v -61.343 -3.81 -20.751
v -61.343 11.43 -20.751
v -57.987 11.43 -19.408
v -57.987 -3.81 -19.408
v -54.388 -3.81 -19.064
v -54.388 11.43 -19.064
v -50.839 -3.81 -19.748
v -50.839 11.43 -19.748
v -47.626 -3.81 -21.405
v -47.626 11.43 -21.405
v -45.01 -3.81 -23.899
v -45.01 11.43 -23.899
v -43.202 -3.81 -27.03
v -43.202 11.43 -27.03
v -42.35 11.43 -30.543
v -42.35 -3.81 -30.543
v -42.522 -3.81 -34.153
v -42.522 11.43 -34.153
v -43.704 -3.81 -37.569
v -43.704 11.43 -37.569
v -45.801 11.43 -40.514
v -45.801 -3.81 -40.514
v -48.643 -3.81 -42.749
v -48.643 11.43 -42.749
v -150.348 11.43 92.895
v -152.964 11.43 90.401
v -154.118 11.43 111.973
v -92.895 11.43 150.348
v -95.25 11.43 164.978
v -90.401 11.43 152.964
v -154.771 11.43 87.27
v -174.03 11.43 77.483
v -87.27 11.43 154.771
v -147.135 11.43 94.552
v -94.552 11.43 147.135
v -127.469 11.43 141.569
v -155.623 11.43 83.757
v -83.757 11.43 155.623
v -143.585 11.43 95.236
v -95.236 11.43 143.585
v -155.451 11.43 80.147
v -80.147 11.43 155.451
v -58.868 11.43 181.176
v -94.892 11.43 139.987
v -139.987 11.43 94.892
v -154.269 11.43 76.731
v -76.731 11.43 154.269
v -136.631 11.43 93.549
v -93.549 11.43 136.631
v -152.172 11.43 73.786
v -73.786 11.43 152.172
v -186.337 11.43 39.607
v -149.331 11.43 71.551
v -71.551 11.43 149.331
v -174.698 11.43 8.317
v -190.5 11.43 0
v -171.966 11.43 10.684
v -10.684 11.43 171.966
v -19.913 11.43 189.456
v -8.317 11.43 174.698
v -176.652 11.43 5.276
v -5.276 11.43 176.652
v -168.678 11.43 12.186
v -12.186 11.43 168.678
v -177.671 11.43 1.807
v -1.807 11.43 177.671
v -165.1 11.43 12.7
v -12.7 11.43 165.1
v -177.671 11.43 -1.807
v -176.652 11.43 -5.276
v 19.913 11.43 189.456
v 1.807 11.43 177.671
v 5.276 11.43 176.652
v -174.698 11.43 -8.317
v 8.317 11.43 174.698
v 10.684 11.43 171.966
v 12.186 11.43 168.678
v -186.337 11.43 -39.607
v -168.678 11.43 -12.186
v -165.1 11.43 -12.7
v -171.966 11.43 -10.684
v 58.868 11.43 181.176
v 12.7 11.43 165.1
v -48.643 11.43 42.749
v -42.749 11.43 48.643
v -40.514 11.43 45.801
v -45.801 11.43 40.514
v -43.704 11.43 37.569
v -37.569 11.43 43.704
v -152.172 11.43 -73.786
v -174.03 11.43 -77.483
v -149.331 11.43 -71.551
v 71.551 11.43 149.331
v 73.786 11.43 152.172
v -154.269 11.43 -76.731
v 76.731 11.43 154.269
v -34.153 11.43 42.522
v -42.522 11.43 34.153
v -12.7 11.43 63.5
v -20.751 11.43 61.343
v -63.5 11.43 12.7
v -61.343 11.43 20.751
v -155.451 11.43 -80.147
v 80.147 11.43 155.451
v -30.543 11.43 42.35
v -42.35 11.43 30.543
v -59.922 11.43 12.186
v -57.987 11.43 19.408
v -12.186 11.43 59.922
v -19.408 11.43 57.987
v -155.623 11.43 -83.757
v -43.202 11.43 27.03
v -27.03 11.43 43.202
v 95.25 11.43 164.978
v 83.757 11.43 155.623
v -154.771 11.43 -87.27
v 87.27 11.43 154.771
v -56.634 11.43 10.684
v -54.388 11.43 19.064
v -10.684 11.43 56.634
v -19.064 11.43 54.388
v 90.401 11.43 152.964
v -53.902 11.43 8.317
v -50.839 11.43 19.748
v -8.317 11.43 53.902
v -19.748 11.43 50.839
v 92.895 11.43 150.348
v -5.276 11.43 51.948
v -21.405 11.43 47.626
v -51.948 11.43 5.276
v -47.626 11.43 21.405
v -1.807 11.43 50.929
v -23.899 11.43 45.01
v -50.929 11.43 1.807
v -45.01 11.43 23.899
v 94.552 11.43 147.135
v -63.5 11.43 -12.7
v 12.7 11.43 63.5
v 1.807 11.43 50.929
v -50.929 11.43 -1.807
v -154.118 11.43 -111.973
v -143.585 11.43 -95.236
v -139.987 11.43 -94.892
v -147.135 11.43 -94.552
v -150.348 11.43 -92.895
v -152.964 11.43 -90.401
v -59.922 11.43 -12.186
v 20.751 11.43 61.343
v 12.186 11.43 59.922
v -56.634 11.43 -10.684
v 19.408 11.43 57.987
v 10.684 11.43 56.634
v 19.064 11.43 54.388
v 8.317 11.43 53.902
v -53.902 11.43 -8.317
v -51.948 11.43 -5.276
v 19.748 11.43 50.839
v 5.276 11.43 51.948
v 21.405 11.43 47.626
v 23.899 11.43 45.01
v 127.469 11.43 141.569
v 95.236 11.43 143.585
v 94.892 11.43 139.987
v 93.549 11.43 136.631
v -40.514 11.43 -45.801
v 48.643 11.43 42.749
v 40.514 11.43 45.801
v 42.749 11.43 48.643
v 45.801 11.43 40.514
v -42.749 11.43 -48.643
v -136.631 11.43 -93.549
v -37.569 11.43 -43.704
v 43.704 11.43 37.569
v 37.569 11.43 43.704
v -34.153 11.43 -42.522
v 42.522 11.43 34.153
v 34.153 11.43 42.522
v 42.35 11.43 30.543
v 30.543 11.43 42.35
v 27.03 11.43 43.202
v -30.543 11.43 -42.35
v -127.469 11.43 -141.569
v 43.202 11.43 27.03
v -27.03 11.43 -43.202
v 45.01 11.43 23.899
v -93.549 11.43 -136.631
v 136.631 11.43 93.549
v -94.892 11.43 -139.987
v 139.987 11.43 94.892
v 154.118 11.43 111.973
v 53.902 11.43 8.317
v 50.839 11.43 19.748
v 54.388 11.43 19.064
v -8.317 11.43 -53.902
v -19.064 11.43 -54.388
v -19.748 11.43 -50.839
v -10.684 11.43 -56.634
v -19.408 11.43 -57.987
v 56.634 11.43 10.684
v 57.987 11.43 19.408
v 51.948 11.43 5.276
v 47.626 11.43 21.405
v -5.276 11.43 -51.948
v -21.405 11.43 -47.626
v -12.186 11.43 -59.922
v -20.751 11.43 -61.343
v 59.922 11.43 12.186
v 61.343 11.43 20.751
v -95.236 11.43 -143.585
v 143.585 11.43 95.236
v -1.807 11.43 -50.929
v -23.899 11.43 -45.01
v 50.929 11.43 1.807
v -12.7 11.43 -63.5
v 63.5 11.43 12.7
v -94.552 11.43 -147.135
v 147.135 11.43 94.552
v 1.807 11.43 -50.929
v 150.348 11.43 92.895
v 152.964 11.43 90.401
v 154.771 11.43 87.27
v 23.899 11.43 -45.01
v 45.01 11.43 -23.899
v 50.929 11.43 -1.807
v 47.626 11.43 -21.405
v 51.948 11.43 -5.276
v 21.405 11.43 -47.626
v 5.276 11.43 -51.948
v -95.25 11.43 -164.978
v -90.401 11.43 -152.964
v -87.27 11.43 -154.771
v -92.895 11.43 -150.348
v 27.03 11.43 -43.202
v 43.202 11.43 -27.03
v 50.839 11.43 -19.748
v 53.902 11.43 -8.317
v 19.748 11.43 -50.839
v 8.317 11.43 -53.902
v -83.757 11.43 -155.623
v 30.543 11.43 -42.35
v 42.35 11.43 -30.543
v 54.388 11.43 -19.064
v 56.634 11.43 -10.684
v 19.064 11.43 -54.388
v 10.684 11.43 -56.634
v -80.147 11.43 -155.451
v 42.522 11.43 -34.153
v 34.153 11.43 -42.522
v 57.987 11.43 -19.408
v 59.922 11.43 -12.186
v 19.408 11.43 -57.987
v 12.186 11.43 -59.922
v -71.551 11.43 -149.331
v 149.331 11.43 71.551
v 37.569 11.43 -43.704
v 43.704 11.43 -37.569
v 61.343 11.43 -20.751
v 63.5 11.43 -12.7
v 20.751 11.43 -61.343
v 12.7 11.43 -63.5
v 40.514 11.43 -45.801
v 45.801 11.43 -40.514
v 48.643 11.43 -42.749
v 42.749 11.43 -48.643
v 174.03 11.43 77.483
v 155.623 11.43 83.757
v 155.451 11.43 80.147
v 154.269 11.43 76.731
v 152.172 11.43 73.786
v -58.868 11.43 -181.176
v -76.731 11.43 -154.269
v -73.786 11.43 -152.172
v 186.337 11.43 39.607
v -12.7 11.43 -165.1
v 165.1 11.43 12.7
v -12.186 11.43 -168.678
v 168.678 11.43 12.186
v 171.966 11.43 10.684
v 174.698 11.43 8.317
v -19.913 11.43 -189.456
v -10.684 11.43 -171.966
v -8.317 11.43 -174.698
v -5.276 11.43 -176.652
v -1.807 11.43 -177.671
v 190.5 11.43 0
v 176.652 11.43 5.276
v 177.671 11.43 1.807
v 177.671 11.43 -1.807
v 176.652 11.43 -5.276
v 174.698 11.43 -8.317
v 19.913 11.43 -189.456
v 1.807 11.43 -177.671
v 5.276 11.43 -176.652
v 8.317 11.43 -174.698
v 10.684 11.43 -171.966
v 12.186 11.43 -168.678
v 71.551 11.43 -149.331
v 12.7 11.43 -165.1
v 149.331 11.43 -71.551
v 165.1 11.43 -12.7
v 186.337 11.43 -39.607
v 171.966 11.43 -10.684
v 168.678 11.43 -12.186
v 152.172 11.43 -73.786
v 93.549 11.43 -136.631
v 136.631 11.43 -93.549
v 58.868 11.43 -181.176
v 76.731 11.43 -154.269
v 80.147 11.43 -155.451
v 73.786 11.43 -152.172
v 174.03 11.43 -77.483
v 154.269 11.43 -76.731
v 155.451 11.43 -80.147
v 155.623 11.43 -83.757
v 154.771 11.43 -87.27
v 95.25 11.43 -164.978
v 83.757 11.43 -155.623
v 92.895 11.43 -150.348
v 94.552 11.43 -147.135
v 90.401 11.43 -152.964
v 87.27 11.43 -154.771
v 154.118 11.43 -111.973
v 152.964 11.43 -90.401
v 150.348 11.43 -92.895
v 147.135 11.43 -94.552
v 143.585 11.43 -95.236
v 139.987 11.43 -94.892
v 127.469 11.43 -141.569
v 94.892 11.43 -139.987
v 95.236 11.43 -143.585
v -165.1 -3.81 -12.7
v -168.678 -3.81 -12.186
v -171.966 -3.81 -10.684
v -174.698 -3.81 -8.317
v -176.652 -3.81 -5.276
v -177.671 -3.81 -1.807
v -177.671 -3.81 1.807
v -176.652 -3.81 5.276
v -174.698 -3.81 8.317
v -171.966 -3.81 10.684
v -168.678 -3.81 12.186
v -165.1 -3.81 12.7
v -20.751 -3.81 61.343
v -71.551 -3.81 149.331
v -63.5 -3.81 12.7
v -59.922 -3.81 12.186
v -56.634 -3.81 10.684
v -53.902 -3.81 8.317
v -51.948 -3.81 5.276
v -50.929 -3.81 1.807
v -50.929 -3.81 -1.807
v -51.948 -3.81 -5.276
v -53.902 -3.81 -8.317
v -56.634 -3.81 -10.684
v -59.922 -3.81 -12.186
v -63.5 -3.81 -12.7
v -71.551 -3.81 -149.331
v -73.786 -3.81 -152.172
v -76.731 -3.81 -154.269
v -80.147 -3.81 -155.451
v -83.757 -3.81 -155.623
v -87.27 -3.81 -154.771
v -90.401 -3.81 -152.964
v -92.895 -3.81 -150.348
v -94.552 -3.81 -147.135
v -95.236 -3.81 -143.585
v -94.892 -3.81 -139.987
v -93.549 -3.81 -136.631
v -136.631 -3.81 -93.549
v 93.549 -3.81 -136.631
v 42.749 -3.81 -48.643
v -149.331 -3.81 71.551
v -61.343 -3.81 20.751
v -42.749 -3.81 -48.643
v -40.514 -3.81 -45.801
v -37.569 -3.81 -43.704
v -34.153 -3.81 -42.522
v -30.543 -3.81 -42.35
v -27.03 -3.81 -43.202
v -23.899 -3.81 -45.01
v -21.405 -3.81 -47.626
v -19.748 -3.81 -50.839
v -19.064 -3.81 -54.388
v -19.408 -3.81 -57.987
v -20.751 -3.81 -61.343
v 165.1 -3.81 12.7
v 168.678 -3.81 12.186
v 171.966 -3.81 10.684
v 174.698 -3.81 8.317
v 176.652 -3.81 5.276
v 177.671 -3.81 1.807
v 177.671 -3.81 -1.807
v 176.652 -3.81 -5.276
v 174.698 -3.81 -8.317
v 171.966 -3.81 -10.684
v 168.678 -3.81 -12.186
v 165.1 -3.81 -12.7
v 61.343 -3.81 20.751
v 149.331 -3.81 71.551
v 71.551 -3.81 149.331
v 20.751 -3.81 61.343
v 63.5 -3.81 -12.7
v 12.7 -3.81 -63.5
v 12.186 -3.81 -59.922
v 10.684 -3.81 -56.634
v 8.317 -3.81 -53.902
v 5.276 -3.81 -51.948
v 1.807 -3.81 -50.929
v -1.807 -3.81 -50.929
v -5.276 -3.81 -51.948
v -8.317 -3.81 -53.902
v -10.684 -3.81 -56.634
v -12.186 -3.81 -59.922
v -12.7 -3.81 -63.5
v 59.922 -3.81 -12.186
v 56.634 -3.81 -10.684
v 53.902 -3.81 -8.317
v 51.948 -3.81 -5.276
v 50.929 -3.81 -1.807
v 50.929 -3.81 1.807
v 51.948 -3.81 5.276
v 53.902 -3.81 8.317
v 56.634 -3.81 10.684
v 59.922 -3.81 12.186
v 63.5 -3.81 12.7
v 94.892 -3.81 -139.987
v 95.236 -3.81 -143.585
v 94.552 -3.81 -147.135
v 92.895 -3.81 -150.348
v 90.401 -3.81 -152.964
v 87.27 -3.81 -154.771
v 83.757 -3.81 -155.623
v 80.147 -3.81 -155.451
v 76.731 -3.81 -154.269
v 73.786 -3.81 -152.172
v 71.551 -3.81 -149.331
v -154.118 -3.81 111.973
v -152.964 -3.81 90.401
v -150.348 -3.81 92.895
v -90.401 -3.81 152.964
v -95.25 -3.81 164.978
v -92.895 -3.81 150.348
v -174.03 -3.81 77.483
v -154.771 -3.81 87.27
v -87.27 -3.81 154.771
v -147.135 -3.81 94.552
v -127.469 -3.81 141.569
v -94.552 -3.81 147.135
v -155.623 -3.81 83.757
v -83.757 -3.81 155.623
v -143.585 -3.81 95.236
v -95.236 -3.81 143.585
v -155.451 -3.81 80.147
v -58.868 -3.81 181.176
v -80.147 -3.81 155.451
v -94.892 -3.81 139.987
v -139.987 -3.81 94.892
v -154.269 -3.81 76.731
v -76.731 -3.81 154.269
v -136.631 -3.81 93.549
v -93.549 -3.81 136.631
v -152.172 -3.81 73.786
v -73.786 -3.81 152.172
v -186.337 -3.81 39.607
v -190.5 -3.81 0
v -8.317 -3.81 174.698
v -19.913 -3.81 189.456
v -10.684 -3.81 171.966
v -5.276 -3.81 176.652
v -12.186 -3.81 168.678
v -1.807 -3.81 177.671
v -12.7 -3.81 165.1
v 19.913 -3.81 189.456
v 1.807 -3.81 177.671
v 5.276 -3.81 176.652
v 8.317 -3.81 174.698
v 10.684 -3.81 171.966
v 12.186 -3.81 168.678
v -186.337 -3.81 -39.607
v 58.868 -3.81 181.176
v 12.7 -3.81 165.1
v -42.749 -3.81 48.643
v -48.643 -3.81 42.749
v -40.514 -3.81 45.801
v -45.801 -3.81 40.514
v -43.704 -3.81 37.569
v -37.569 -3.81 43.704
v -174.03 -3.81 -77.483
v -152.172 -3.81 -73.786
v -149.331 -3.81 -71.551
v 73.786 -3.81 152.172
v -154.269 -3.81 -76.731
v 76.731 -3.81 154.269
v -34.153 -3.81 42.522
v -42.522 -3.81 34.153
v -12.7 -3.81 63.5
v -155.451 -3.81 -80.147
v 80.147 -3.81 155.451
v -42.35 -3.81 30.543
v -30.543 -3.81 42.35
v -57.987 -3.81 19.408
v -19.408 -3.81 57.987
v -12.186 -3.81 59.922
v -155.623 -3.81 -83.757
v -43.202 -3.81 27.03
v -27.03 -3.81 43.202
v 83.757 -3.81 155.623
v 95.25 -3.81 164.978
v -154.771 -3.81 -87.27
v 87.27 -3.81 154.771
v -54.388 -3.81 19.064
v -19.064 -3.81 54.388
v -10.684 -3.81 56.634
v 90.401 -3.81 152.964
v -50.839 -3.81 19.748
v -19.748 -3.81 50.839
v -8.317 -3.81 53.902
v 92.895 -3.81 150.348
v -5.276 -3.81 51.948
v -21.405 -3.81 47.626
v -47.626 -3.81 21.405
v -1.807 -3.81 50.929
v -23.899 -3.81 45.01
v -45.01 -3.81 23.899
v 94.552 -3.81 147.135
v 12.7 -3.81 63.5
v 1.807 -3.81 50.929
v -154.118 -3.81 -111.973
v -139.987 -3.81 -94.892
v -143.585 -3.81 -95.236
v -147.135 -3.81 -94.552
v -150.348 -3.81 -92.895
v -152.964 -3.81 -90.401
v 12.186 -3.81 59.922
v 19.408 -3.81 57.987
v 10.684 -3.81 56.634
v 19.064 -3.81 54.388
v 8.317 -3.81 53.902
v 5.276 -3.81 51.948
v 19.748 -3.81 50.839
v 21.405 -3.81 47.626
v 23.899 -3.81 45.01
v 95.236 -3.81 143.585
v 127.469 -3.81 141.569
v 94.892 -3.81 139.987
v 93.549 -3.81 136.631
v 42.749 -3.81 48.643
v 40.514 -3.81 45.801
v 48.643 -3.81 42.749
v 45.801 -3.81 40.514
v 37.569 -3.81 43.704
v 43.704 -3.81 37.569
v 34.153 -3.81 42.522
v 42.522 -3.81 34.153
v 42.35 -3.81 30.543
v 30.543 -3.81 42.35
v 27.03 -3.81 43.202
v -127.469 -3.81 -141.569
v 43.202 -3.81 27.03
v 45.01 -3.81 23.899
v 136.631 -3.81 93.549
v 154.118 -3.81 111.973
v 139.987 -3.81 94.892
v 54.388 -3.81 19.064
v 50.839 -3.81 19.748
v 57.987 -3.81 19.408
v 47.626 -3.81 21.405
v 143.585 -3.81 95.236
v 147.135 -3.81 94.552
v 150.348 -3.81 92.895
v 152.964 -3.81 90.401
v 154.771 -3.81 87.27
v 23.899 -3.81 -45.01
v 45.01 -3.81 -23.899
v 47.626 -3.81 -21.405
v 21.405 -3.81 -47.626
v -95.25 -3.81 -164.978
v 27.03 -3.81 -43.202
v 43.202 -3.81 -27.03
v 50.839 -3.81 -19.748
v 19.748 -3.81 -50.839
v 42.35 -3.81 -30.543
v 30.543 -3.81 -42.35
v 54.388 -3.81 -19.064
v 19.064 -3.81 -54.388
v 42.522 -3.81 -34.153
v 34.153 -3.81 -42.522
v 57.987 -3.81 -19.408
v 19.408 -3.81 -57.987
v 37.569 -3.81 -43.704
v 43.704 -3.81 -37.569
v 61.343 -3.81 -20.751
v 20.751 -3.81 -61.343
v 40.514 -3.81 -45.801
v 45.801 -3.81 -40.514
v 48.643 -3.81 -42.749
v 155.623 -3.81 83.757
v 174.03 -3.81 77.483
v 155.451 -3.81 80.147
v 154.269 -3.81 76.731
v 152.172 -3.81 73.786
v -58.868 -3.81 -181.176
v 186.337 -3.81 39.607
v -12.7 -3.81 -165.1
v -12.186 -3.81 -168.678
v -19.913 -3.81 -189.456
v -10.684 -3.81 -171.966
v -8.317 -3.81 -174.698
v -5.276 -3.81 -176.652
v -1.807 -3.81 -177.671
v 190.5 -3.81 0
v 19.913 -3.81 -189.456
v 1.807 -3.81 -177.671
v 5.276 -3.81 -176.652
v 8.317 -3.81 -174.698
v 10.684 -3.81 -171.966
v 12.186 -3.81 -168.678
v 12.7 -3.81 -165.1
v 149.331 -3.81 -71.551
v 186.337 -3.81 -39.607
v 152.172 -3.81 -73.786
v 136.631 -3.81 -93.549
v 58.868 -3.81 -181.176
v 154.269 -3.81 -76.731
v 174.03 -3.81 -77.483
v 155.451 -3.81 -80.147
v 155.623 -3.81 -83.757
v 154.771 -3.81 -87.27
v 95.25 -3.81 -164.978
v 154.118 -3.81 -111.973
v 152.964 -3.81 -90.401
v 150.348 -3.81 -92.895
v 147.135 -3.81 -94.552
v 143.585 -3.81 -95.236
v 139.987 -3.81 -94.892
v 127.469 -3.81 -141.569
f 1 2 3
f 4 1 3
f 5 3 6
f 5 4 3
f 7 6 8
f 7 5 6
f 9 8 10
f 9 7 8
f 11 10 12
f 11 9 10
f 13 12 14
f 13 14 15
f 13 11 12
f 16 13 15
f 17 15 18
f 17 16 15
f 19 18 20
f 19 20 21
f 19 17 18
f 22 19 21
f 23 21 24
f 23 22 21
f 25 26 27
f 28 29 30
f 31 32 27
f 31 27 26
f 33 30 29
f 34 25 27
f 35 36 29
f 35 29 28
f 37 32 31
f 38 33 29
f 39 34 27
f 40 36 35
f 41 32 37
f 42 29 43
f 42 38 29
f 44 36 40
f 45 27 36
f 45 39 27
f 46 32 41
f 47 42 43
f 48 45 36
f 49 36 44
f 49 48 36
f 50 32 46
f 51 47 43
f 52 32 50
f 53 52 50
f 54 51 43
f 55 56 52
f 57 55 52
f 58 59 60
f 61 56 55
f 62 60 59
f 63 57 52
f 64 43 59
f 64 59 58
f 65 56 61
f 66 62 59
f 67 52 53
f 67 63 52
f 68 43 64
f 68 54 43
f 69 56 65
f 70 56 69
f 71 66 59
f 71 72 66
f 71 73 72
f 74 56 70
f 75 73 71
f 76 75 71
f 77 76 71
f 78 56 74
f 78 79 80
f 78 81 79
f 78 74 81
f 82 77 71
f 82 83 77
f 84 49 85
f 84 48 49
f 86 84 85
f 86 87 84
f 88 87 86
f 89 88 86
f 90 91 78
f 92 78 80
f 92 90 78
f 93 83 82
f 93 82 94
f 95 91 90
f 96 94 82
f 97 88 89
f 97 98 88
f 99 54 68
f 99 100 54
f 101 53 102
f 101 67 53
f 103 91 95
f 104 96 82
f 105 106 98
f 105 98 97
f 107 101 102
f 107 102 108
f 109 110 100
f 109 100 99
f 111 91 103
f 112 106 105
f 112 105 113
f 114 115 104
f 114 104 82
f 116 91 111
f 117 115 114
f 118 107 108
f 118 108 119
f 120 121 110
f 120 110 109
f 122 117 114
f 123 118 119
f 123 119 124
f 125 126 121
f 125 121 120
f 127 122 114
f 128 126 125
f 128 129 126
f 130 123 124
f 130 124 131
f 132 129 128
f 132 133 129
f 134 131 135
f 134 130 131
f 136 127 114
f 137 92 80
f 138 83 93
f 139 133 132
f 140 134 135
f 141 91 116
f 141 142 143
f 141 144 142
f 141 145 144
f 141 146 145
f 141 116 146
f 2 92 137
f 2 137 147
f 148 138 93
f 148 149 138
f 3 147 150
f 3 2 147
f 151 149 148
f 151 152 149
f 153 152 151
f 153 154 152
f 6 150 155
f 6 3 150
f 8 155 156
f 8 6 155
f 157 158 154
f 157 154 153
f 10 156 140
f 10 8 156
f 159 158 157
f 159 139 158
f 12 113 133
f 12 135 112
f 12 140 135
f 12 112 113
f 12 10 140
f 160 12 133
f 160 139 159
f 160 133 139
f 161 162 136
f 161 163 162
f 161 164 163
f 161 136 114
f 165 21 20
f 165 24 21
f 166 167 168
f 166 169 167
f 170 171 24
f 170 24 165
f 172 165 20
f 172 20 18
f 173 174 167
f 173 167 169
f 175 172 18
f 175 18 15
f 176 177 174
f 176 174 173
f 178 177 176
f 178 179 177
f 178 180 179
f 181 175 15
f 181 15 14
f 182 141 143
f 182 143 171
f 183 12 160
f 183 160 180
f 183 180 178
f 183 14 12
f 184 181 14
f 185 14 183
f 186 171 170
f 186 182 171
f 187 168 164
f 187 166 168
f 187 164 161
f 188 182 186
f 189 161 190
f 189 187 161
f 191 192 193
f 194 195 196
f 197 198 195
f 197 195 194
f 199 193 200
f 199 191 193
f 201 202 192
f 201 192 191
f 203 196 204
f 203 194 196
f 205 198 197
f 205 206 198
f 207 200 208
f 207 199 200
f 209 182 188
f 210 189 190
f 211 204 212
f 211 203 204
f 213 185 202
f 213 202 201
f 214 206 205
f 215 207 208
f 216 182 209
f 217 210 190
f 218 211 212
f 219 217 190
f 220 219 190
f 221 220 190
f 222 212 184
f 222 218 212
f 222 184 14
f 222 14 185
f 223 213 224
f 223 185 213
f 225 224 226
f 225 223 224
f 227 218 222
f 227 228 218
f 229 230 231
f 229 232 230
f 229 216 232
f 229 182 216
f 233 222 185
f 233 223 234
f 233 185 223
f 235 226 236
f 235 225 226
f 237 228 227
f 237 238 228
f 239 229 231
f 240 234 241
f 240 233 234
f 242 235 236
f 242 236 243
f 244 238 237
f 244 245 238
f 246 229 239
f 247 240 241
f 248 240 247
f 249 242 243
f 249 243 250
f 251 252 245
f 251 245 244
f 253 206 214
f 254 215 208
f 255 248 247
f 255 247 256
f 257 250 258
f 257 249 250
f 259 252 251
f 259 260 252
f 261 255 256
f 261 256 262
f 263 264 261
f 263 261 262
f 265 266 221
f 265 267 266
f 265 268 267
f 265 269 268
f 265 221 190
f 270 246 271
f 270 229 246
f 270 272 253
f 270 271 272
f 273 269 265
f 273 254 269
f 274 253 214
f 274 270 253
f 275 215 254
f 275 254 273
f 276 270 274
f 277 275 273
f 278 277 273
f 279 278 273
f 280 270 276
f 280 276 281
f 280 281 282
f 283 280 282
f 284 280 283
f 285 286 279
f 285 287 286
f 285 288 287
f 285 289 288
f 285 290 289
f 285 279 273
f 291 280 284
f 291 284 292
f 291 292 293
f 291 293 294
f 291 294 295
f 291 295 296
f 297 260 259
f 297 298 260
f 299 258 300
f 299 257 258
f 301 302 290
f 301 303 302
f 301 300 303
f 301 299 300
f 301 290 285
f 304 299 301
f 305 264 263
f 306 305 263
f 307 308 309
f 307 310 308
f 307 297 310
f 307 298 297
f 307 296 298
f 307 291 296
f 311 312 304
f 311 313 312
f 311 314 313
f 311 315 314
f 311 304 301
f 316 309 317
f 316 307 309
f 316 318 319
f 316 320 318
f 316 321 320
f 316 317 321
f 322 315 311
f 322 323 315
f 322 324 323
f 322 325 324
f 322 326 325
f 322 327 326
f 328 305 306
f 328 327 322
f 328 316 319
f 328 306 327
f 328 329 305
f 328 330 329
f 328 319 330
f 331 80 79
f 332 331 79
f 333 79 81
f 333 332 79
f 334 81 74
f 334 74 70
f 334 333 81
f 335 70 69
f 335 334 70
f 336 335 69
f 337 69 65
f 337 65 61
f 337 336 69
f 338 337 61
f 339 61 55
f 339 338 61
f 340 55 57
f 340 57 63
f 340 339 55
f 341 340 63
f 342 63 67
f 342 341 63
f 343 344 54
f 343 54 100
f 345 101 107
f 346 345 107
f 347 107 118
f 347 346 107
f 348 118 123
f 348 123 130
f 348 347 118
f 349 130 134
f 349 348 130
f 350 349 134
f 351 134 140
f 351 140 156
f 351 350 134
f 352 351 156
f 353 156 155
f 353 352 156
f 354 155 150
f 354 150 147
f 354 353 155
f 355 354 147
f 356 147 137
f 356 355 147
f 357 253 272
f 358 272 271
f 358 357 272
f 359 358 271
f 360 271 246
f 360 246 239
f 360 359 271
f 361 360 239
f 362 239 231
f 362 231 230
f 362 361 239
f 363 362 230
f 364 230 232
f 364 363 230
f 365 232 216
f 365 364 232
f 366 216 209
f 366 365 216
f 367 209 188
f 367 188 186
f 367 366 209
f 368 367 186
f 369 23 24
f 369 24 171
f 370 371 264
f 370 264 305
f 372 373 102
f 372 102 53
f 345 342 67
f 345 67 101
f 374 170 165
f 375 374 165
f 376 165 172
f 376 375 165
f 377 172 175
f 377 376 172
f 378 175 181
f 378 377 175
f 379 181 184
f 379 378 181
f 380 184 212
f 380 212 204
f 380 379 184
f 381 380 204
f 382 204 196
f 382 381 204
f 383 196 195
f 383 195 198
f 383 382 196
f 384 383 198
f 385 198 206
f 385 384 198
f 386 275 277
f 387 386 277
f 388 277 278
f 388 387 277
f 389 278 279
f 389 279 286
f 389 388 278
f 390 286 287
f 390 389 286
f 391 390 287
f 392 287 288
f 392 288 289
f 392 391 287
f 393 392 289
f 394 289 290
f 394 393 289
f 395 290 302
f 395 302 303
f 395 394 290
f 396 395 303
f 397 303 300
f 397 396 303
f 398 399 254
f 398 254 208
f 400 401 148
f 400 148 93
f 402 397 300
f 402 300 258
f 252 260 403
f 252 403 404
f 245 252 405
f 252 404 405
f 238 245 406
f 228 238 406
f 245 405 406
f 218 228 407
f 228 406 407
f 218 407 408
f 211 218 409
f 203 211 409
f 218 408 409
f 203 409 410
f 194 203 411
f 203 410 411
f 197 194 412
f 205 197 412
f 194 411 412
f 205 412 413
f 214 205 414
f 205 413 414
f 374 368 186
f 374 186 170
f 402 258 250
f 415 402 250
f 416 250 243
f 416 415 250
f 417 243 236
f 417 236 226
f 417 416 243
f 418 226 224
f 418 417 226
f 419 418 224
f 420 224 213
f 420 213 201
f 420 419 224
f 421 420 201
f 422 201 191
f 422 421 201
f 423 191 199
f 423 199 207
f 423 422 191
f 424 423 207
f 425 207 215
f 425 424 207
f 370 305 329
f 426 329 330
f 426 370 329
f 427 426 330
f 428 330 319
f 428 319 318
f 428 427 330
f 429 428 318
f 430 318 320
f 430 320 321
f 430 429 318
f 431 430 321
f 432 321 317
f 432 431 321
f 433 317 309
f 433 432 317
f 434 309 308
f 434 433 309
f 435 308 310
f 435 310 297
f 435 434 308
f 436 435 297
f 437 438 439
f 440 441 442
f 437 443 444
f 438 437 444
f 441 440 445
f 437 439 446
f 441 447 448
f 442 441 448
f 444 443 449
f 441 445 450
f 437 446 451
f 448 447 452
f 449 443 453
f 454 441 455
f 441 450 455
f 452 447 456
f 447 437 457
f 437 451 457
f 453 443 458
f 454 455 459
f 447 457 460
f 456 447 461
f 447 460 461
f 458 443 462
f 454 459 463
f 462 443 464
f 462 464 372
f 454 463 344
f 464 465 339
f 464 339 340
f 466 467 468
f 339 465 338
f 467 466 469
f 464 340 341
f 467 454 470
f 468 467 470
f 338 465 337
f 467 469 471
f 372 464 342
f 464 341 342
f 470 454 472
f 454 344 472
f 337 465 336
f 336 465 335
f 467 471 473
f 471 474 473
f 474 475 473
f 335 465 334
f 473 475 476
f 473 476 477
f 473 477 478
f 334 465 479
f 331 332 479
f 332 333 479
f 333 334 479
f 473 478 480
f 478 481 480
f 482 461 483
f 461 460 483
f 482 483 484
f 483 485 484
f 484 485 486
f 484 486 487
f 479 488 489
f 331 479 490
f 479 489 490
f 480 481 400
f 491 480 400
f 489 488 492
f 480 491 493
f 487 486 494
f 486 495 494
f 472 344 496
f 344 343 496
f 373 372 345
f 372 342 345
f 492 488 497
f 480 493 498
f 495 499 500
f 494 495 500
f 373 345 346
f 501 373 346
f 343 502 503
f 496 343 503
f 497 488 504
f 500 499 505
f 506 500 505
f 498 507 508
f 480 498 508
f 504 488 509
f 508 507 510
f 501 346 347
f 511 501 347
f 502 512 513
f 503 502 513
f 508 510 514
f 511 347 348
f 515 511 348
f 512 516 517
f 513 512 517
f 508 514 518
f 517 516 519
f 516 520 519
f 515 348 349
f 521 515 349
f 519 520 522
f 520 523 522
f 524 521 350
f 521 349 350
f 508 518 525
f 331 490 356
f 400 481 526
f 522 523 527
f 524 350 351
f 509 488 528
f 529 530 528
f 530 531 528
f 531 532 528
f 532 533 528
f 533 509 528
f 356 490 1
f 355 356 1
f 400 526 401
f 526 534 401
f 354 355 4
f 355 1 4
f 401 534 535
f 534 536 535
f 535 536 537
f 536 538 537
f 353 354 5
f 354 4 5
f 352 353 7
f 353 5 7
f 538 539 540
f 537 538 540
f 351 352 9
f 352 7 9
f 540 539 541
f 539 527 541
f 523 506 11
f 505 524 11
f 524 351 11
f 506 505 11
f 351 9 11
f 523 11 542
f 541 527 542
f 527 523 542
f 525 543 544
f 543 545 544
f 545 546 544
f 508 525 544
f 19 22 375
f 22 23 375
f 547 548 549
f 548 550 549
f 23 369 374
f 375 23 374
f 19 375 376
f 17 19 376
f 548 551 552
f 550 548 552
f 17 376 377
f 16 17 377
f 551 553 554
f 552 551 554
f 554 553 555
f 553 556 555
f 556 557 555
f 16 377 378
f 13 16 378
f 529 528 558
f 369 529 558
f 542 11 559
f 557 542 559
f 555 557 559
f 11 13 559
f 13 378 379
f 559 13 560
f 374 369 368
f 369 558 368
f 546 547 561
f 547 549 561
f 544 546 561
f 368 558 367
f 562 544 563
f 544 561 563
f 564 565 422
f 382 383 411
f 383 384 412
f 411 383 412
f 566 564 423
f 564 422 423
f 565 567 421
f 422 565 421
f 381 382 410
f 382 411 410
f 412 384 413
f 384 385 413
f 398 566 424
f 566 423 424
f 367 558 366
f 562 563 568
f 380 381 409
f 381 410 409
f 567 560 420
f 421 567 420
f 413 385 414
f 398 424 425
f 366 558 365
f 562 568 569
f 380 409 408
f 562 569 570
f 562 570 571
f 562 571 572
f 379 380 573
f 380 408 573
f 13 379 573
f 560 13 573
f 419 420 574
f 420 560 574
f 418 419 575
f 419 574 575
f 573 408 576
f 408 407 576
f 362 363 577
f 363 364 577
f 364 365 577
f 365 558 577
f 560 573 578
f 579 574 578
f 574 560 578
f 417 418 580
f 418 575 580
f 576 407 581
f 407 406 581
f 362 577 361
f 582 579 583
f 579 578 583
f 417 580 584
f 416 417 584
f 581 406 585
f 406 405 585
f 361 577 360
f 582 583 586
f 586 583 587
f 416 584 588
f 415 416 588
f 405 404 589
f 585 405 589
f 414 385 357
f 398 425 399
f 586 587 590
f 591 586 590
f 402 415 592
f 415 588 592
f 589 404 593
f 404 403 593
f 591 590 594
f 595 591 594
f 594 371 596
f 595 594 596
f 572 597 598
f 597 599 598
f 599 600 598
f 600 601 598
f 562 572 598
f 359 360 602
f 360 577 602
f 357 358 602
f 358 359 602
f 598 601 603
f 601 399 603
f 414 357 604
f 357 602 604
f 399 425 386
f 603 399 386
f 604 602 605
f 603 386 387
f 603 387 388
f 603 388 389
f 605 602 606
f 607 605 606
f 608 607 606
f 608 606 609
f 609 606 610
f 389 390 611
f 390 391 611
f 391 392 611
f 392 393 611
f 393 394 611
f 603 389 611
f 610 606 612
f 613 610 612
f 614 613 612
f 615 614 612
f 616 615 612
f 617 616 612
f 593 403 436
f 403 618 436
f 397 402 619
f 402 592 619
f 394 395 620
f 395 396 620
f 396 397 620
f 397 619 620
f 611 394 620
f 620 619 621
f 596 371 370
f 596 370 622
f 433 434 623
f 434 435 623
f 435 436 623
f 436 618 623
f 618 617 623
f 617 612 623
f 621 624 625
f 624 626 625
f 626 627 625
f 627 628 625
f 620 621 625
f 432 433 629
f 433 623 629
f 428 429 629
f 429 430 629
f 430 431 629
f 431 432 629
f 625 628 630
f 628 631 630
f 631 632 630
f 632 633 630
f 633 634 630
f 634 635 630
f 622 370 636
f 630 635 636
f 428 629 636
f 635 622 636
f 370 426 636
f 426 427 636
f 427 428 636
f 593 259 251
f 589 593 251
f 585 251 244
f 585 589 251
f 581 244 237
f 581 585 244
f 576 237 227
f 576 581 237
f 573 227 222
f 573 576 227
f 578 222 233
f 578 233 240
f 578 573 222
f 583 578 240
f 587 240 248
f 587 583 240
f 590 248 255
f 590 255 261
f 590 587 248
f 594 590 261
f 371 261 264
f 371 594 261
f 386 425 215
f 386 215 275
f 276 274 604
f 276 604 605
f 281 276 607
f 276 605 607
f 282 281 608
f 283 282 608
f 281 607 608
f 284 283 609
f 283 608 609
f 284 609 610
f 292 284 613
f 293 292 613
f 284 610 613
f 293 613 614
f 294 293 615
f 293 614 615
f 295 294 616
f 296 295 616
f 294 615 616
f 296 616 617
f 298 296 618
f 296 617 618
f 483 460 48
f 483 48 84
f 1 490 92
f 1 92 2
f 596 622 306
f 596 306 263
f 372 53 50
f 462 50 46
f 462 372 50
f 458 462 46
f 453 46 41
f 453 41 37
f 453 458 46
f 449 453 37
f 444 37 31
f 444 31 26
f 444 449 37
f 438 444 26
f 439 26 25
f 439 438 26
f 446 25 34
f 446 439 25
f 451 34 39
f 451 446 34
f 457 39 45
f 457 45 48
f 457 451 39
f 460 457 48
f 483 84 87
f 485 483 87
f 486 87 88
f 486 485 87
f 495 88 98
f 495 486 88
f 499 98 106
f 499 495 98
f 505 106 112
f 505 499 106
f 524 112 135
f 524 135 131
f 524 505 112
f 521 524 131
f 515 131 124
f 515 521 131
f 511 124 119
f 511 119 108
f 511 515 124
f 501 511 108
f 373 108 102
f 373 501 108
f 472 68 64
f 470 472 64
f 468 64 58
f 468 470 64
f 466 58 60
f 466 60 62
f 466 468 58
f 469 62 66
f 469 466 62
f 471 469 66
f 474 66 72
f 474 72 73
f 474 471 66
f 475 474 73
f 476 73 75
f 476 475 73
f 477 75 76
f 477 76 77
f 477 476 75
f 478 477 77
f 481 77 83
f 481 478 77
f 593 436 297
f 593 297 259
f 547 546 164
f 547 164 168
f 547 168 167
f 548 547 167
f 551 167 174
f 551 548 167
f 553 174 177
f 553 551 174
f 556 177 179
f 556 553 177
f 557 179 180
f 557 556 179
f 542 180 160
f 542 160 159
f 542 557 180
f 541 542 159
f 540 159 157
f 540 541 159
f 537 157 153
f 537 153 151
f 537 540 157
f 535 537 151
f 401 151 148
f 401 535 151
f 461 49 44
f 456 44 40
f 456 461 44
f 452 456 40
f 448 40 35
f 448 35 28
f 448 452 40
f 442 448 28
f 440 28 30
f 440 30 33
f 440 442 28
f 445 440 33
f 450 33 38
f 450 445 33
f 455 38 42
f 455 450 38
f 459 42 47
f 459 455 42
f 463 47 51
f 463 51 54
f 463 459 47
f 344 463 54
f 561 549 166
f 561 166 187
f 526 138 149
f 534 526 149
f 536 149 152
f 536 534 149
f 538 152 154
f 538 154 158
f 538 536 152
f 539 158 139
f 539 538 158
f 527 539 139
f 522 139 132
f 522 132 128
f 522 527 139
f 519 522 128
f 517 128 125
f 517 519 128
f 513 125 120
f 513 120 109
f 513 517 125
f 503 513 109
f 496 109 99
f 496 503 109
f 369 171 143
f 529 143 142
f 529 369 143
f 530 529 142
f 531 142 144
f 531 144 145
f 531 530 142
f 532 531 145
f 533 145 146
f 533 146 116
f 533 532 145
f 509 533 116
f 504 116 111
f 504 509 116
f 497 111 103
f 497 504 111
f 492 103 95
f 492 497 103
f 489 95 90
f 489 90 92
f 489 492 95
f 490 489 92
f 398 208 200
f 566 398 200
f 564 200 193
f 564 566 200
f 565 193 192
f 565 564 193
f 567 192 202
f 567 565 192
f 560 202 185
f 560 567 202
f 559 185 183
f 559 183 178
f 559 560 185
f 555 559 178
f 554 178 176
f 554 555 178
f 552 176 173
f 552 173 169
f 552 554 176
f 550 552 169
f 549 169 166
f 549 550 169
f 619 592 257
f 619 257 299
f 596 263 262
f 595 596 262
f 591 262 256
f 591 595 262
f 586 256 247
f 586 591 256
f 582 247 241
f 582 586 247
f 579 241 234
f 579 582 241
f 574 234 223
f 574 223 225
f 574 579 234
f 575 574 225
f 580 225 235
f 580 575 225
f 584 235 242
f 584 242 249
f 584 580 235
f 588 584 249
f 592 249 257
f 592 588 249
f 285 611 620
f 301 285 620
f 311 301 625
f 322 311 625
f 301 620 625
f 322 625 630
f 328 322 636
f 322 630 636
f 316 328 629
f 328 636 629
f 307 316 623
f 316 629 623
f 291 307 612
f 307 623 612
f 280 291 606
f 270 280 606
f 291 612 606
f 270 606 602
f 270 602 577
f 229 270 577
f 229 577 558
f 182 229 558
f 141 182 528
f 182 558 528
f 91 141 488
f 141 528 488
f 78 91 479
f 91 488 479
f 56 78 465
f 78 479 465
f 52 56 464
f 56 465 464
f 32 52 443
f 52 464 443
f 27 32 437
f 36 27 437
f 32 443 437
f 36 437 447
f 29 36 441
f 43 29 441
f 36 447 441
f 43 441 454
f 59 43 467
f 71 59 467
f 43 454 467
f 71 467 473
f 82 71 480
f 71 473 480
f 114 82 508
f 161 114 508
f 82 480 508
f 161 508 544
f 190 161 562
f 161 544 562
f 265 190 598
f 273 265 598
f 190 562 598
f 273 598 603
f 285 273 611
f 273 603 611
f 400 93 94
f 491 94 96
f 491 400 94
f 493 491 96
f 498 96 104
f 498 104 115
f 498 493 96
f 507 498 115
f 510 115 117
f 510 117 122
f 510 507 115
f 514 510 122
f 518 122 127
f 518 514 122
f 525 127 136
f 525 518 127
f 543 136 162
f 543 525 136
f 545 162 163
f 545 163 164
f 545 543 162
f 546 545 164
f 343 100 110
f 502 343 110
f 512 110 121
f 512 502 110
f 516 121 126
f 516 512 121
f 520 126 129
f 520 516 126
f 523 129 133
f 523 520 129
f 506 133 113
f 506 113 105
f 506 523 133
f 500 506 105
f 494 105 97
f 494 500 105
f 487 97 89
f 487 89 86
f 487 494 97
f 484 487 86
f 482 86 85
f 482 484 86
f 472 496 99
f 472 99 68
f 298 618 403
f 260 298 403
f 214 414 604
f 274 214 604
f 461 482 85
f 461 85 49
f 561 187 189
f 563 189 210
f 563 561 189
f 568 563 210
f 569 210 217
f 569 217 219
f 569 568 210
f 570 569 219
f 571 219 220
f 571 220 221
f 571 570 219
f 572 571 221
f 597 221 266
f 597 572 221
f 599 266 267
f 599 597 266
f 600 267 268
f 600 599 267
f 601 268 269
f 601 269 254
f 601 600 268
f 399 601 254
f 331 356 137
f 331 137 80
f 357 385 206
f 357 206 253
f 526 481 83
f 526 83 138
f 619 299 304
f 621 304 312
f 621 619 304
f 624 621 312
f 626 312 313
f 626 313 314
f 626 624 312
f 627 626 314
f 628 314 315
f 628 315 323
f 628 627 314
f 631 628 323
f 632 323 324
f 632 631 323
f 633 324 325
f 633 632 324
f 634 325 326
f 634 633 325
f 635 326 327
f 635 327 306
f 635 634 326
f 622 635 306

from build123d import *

# Parameters (mm, degrees)
SKETCH1_R           = 95.25
BOSS_EXTRUDE3_DEPTH = 7.62
SCALE1_SCALE        = 2


with BuildPart() as part:
    # Sketch1 → Boss-Extrude3 (new body)
    with BuildSketch(Plane(origin=(0, 0, 0), x_dir=(1, 0, 0), z_dir=(0, 1, 0))):
        Circle(SKETCH1_R)
        with BuildLine():
            Line((6.35, 82.55), (6.35, 31.75))
            ThreePointArc((6.35, 31.75), (0, 25.4), (-6.35, 31.75))
            Line((-6.35, 31.75), (-6.35, 82.55))
            ThreePointArc((-6.35, 82.55), (0, 88.9), (6.35, 82.55))
        make_face(mode=Mode.SUBTRACT)
        with BuildLine():
            Line((35.775738686, 74.665397082), (10.375738686, 30.67130657))
            ThreePointArc((10.375738686, 30.67130657), (12.7, 21.997045256), (21.374261314, 24.32130657))
            Line((21.374261314, 24.32130657), (46.774261314, 68.315397082))
            ThreePointArc((46.774261314, 68.315397082), (44.45, 76.989658396), (35.775738686, 74.665397082))
        make_face(mode=Mode.SUBTRACT)
        with BuildLine():
            Line((68.315397082, 46.774261314), (24.32130657, 21.374261314))
            ThreePointArc((24.32130657, 21.374261314), (21.997045256, 12.7), (30.67130657, 10.375738686))
            Line((30.67130657, 10.375738686), (74.665397082, 35.775738686))
            ThreePointArc((74.665397082, 35.775738686), (76.989658396, 44.45), (68.315397082, 46.774261314))
        make_face(mode=Mode.SUBTRACT)
        with BuildLine():
            Line((82.55, 6.35), (31.75, 6.35))
            ThreePointArc((31.75, 6.35), (25.4, 0), (31.75, -6.35))
            Line((31.75, -6.35), (82.55, -6.35))
            ThreePointArc((82.55, -6.35), (88.9, 0), (82.55, 6.35))
        make_face(mode=Mode.SUBTRACT)
        with BuildLine():
            Line((74.665397082, -35.775738686), (30.67130657, -10.375738686))
            ThreePointArc((30.67130657, -10.375738686), (21.997045256, -12.7), (24.32130657, -21.374261314))
            Line((24.32130657, -21.374261314), (68.315397082, -46.774261314))
            ThreePointArc((68.315397082, -46.774261314), (76.989658396, -44.45), (74.665397082, -35.775738686))
        make_face(mode=Mode.SUBTRACT)
        with BuildLine():
            Line((46.774261314, -68.315397082), (21.374261314, -24.32130657))
            ThreePointArc((21.374261314, -24.32130657), (12.7, -21.997045256), (10.375738686, -30.67130657))
            Line((10.375738686, -30.67130657), (35.775738686, -74.665397082))
            ThreePointArc((35.775738686, -74.665397082), (44.45, -76.989658396), (46.774261314, -68.315397082))
        make_face(mode=Mode.SUBTRACT)
        with BuildLine():
            Line((6.35, -82.55), (6.35, -31.75))
            ThreePointArc((6.35, -31.75), (0, -25.4), (-6.35, -31.75))
            Line((-6.35, -31.75), (-6.35, -82.55))
            ThreePointArc((-6.35, -82.55), (0, -88.9), (6.35, -82.55))
        make_face(mode=Mode.SUBTRACT)
        with BuildLine():
            Line((-35.775738686, -74.665397082), (-10.375738686, -30.67130657))
            ThreePointArc((-10.375738686, -30.67130657), (-12.7, -21.997045256), (-21.374261314, -24.32130657))
            Line((-21.374261314, -24.32130657), (-46.774261314, -68.315397082))
            ThreePointArc((-46.774261314, -68.315397082), (-44.45, -76.989658396), (-35.775738686, -74.665397082))
        make_face(mode=Mode.SUBTRACT)
        with BuildLine():
            Line((-68.315397082, -46.774261314), (-24.32130657, -21.374261314))
            ThreePointArc((-24.32130657, -21.374261314), (-21.997045256, -12.7), (-30.67130657, -10.375738686))
            Line((-30.67130657, -10.375738686), (-74.665397082, -35.775738686))
            ThreePointArc((-74.665397082, -35.775738686), (-76.989658396, -44.45), (-68.315397082, -46.774261314))
        make_face(mode=Mode.SUBTRACT)
        with BuildLine():
            Line((-82.55, -6.35), (-31.75, -6.35))
            ThreePointArc((-31.75, -6.35), (-25.4, 0), (-31.75, 6.35))
            Line((-31.75, 6.35), (-82.55, 6.35))
            ThreePointArc((-82.55, 6.35), (-88.9, 0), (-82.55, -6.35))
        make_face(mode=Mode.SUBTRACT)
        with BuildLine():
            Line((-74.665397082, 35.775738686), (-30.67130657, 10.375738686))
            ThreePointArc((-30.67130657, 10.375738686), (-21.997045256, 12.7), (-24.32130657, 21.374261314))
            Line((-24.32130657, 21.374261314), (-68.315397082, 46.774261314))
            ThreePointArc((-68.315397082, 46.774261314), (-76.989658396, 44.45), (-74.665397082, 35.775738686))
        make_face(mode=Mode.SUBTRACT)
        with BuildLine():
            Line((-46.774261314, 68.315397082), (-21.374261314, 24.32130657))
            ThreePointArc((-21.374261314, 24.32130657), (-12.7, 21.997045256), (-10.375738686, 30.67130657))
            Line((-10.375738686, 30.67130657), (-35.775738686, 74.665397082))
            ThreePointArc((-35.775738686, 74.665397082), (-44.45, 76.989658396), (-46.774261314, 68.315397082))
        make_face(mode=Mode.SUBTRACT)
    extrude(amount=BOSS_EXTRUDE3_DEPTH)


with BuildPart() as part_1:
    # Scale1: scaled about (0, 3.81, 0)
    add(part.part.scale(SCALE1_SCALE).moved(Location((0, -3.81, 0))))


solid = part_1.part
